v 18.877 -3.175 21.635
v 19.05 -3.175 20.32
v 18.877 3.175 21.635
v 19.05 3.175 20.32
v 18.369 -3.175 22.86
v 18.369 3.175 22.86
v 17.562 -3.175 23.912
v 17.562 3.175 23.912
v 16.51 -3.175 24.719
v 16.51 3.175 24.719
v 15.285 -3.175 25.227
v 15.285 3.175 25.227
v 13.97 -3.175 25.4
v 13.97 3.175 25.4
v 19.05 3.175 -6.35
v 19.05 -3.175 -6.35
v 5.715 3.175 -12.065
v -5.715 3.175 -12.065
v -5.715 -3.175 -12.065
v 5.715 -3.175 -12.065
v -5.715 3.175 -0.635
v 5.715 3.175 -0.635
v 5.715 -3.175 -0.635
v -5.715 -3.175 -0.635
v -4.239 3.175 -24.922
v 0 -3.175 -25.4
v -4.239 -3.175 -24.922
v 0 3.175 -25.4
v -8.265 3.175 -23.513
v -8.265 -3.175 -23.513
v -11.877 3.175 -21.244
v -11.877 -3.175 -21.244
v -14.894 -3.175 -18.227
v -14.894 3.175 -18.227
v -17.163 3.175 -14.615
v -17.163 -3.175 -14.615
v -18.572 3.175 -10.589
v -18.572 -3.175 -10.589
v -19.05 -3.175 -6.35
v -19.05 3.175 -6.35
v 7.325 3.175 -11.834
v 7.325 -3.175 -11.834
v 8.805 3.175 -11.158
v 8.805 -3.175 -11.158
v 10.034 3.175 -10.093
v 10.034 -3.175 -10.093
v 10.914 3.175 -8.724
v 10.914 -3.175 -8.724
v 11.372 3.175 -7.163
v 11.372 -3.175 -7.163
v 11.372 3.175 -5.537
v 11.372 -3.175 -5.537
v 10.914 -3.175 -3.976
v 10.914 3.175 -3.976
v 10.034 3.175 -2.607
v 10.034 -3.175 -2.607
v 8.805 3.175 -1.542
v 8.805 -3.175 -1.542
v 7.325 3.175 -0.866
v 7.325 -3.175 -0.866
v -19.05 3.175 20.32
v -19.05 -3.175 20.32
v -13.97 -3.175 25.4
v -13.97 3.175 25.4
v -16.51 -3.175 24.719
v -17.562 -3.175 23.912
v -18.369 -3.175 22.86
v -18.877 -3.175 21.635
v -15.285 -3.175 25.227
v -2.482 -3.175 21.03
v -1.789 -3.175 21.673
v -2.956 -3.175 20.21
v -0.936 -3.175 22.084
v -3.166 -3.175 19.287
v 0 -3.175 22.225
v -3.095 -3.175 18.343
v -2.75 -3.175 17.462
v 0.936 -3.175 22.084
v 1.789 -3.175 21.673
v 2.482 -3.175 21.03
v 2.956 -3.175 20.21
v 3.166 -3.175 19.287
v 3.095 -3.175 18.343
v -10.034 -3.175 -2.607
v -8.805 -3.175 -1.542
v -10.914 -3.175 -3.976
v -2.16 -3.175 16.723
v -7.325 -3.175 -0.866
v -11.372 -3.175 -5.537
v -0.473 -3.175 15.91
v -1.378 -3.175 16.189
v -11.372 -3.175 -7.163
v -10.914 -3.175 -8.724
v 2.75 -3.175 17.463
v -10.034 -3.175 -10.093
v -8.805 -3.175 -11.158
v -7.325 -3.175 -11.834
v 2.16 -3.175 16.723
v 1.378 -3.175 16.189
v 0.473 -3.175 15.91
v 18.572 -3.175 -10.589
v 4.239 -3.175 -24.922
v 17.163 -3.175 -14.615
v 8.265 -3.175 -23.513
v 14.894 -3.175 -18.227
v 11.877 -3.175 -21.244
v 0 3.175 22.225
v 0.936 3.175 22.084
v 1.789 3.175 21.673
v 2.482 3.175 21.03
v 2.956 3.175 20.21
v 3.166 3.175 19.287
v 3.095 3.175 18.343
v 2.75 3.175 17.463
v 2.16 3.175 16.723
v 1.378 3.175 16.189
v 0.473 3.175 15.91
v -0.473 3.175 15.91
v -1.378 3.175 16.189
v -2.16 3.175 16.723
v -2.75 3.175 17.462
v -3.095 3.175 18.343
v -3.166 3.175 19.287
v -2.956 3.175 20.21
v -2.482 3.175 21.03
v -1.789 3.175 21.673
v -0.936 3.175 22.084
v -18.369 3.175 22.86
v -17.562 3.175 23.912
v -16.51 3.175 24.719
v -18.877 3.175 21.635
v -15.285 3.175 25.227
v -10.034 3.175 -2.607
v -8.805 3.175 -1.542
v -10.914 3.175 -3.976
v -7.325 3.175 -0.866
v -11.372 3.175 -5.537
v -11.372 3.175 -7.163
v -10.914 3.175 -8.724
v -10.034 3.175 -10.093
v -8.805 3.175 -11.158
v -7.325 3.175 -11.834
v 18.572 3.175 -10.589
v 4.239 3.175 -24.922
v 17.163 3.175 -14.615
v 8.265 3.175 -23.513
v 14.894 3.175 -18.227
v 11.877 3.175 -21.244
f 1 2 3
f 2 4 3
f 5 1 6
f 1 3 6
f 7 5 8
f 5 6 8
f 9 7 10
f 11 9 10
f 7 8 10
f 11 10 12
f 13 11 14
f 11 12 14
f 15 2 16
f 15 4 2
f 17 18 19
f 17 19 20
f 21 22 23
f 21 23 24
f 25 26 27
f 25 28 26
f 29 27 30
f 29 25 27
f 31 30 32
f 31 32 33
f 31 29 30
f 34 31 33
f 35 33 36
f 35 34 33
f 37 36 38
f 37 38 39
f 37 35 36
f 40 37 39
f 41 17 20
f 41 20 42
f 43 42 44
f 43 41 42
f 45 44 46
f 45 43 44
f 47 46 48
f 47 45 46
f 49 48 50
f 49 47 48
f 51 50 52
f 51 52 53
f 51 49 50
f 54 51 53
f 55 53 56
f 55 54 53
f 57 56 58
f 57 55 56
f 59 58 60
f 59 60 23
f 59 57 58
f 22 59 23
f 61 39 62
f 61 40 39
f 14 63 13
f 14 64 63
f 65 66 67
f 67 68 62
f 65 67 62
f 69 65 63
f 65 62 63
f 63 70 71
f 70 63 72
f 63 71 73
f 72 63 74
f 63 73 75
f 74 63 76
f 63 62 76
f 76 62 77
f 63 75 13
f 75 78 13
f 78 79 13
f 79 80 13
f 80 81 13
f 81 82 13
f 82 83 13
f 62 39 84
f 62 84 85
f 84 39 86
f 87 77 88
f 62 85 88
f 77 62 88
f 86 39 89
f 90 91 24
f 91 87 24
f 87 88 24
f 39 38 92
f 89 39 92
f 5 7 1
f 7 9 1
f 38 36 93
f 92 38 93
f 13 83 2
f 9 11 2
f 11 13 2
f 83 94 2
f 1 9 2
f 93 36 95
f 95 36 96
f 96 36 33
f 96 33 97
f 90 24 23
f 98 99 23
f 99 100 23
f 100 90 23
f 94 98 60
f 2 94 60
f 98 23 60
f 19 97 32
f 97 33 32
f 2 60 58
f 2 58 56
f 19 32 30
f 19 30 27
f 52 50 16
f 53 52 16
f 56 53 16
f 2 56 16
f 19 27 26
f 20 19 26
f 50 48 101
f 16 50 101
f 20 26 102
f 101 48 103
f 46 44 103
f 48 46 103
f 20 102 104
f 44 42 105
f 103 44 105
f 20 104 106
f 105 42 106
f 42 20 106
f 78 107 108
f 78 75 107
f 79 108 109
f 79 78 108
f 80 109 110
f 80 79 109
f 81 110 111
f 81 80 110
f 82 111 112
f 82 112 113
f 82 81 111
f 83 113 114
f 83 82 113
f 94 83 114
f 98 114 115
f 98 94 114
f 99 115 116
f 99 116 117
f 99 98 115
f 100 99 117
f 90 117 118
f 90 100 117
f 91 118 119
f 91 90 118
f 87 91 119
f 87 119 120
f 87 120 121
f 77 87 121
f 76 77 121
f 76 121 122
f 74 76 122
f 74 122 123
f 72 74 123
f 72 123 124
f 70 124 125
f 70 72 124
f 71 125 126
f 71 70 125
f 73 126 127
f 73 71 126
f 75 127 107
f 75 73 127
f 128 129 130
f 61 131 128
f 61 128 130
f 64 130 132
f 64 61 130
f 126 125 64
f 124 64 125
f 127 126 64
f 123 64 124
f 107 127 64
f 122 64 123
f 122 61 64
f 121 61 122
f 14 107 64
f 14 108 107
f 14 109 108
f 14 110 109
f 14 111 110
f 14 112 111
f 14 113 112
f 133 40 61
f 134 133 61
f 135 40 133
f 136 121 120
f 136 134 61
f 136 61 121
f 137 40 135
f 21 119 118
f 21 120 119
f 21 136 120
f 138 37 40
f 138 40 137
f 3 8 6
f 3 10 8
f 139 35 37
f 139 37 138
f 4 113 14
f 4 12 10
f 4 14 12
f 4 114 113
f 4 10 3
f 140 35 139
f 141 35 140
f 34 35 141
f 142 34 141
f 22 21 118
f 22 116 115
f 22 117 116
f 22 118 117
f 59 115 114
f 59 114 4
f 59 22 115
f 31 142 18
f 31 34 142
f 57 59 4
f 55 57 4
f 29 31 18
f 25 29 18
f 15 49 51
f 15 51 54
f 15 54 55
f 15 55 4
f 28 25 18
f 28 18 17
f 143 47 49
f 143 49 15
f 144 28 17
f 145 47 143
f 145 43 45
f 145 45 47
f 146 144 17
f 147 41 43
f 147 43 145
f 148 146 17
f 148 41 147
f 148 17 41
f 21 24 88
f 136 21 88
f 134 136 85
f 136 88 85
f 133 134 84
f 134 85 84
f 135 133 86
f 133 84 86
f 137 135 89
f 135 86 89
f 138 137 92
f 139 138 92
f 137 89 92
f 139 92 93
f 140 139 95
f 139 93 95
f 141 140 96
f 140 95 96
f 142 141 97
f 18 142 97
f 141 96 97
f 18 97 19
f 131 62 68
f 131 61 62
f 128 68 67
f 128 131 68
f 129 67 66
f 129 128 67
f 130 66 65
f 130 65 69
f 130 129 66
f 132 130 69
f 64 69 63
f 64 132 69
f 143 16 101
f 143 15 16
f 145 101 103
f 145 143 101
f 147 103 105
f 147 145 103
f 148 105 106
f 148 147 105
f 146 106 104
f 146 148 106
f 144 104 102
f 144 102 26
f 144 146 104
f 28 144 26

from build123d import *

# Parameters (mm, degrees)
SKETCH2_R           = 3.175
BOSS_EXTRUDE1_DEPTH = 3.175
FILLET1_R           = 5.08


with BuildPart() as part:
    # Sketch2 → Boss-Extrude1 (new, symmetric)
    with BuildSketch(Plane(origin=(0, 0, 0), x_dir=(1, 0, 0), z_dir=(0, 1, 0))):
        with BuildLine():
            Line((-19.05, 6.35), (-19.05, -25.4))
            Line((-19.05, -25.4), (19.05, -25.4))
            Line((19.05, -25.4), (19.05, 6.35))
            ThreePointArc((19.05, 6.35), (13.470384188, 19.820384175), (1.9e-08, 25.4))
            ThreePointArc((1.9e-08, 25.4), (-13.470384175, 19.820384188), (-19.05, 6.35))
        make_face()
        with Locations(Location((0, -19.05, 0), (0, 0, 270))):
            Circle(SKETCH2_R, mode=Mode.SUBTRACT)
        with BuildLine():
            ThreePointArc((-5.715, 0.635), (-11.43, 6.35), (-5.715, 12.065))
            Line((-5.715, 12.065), (5.715, 12.065))
            ThreePointArc((5.715, 12.065), (11.43, 6.35), (5.715, 0.635))
            Line((5.715, 0.635), (-5.715, 0.635))
        make_face(mode=Mode.SUBTRACT)
    extrude(amount=BOSS_EXTRUDE1_DEPTH, both=True)

    # Fillet1
    fillet1_edges = [part.edges().sort_by_distance(p)[0] for p in [
        (19.05, -1.5875, 25.4),
        (-19.05, -1.5875, 25.4),
    ]]
    fillet(fillet1_edges, radius=FILLET1_R)


solid = part.part
